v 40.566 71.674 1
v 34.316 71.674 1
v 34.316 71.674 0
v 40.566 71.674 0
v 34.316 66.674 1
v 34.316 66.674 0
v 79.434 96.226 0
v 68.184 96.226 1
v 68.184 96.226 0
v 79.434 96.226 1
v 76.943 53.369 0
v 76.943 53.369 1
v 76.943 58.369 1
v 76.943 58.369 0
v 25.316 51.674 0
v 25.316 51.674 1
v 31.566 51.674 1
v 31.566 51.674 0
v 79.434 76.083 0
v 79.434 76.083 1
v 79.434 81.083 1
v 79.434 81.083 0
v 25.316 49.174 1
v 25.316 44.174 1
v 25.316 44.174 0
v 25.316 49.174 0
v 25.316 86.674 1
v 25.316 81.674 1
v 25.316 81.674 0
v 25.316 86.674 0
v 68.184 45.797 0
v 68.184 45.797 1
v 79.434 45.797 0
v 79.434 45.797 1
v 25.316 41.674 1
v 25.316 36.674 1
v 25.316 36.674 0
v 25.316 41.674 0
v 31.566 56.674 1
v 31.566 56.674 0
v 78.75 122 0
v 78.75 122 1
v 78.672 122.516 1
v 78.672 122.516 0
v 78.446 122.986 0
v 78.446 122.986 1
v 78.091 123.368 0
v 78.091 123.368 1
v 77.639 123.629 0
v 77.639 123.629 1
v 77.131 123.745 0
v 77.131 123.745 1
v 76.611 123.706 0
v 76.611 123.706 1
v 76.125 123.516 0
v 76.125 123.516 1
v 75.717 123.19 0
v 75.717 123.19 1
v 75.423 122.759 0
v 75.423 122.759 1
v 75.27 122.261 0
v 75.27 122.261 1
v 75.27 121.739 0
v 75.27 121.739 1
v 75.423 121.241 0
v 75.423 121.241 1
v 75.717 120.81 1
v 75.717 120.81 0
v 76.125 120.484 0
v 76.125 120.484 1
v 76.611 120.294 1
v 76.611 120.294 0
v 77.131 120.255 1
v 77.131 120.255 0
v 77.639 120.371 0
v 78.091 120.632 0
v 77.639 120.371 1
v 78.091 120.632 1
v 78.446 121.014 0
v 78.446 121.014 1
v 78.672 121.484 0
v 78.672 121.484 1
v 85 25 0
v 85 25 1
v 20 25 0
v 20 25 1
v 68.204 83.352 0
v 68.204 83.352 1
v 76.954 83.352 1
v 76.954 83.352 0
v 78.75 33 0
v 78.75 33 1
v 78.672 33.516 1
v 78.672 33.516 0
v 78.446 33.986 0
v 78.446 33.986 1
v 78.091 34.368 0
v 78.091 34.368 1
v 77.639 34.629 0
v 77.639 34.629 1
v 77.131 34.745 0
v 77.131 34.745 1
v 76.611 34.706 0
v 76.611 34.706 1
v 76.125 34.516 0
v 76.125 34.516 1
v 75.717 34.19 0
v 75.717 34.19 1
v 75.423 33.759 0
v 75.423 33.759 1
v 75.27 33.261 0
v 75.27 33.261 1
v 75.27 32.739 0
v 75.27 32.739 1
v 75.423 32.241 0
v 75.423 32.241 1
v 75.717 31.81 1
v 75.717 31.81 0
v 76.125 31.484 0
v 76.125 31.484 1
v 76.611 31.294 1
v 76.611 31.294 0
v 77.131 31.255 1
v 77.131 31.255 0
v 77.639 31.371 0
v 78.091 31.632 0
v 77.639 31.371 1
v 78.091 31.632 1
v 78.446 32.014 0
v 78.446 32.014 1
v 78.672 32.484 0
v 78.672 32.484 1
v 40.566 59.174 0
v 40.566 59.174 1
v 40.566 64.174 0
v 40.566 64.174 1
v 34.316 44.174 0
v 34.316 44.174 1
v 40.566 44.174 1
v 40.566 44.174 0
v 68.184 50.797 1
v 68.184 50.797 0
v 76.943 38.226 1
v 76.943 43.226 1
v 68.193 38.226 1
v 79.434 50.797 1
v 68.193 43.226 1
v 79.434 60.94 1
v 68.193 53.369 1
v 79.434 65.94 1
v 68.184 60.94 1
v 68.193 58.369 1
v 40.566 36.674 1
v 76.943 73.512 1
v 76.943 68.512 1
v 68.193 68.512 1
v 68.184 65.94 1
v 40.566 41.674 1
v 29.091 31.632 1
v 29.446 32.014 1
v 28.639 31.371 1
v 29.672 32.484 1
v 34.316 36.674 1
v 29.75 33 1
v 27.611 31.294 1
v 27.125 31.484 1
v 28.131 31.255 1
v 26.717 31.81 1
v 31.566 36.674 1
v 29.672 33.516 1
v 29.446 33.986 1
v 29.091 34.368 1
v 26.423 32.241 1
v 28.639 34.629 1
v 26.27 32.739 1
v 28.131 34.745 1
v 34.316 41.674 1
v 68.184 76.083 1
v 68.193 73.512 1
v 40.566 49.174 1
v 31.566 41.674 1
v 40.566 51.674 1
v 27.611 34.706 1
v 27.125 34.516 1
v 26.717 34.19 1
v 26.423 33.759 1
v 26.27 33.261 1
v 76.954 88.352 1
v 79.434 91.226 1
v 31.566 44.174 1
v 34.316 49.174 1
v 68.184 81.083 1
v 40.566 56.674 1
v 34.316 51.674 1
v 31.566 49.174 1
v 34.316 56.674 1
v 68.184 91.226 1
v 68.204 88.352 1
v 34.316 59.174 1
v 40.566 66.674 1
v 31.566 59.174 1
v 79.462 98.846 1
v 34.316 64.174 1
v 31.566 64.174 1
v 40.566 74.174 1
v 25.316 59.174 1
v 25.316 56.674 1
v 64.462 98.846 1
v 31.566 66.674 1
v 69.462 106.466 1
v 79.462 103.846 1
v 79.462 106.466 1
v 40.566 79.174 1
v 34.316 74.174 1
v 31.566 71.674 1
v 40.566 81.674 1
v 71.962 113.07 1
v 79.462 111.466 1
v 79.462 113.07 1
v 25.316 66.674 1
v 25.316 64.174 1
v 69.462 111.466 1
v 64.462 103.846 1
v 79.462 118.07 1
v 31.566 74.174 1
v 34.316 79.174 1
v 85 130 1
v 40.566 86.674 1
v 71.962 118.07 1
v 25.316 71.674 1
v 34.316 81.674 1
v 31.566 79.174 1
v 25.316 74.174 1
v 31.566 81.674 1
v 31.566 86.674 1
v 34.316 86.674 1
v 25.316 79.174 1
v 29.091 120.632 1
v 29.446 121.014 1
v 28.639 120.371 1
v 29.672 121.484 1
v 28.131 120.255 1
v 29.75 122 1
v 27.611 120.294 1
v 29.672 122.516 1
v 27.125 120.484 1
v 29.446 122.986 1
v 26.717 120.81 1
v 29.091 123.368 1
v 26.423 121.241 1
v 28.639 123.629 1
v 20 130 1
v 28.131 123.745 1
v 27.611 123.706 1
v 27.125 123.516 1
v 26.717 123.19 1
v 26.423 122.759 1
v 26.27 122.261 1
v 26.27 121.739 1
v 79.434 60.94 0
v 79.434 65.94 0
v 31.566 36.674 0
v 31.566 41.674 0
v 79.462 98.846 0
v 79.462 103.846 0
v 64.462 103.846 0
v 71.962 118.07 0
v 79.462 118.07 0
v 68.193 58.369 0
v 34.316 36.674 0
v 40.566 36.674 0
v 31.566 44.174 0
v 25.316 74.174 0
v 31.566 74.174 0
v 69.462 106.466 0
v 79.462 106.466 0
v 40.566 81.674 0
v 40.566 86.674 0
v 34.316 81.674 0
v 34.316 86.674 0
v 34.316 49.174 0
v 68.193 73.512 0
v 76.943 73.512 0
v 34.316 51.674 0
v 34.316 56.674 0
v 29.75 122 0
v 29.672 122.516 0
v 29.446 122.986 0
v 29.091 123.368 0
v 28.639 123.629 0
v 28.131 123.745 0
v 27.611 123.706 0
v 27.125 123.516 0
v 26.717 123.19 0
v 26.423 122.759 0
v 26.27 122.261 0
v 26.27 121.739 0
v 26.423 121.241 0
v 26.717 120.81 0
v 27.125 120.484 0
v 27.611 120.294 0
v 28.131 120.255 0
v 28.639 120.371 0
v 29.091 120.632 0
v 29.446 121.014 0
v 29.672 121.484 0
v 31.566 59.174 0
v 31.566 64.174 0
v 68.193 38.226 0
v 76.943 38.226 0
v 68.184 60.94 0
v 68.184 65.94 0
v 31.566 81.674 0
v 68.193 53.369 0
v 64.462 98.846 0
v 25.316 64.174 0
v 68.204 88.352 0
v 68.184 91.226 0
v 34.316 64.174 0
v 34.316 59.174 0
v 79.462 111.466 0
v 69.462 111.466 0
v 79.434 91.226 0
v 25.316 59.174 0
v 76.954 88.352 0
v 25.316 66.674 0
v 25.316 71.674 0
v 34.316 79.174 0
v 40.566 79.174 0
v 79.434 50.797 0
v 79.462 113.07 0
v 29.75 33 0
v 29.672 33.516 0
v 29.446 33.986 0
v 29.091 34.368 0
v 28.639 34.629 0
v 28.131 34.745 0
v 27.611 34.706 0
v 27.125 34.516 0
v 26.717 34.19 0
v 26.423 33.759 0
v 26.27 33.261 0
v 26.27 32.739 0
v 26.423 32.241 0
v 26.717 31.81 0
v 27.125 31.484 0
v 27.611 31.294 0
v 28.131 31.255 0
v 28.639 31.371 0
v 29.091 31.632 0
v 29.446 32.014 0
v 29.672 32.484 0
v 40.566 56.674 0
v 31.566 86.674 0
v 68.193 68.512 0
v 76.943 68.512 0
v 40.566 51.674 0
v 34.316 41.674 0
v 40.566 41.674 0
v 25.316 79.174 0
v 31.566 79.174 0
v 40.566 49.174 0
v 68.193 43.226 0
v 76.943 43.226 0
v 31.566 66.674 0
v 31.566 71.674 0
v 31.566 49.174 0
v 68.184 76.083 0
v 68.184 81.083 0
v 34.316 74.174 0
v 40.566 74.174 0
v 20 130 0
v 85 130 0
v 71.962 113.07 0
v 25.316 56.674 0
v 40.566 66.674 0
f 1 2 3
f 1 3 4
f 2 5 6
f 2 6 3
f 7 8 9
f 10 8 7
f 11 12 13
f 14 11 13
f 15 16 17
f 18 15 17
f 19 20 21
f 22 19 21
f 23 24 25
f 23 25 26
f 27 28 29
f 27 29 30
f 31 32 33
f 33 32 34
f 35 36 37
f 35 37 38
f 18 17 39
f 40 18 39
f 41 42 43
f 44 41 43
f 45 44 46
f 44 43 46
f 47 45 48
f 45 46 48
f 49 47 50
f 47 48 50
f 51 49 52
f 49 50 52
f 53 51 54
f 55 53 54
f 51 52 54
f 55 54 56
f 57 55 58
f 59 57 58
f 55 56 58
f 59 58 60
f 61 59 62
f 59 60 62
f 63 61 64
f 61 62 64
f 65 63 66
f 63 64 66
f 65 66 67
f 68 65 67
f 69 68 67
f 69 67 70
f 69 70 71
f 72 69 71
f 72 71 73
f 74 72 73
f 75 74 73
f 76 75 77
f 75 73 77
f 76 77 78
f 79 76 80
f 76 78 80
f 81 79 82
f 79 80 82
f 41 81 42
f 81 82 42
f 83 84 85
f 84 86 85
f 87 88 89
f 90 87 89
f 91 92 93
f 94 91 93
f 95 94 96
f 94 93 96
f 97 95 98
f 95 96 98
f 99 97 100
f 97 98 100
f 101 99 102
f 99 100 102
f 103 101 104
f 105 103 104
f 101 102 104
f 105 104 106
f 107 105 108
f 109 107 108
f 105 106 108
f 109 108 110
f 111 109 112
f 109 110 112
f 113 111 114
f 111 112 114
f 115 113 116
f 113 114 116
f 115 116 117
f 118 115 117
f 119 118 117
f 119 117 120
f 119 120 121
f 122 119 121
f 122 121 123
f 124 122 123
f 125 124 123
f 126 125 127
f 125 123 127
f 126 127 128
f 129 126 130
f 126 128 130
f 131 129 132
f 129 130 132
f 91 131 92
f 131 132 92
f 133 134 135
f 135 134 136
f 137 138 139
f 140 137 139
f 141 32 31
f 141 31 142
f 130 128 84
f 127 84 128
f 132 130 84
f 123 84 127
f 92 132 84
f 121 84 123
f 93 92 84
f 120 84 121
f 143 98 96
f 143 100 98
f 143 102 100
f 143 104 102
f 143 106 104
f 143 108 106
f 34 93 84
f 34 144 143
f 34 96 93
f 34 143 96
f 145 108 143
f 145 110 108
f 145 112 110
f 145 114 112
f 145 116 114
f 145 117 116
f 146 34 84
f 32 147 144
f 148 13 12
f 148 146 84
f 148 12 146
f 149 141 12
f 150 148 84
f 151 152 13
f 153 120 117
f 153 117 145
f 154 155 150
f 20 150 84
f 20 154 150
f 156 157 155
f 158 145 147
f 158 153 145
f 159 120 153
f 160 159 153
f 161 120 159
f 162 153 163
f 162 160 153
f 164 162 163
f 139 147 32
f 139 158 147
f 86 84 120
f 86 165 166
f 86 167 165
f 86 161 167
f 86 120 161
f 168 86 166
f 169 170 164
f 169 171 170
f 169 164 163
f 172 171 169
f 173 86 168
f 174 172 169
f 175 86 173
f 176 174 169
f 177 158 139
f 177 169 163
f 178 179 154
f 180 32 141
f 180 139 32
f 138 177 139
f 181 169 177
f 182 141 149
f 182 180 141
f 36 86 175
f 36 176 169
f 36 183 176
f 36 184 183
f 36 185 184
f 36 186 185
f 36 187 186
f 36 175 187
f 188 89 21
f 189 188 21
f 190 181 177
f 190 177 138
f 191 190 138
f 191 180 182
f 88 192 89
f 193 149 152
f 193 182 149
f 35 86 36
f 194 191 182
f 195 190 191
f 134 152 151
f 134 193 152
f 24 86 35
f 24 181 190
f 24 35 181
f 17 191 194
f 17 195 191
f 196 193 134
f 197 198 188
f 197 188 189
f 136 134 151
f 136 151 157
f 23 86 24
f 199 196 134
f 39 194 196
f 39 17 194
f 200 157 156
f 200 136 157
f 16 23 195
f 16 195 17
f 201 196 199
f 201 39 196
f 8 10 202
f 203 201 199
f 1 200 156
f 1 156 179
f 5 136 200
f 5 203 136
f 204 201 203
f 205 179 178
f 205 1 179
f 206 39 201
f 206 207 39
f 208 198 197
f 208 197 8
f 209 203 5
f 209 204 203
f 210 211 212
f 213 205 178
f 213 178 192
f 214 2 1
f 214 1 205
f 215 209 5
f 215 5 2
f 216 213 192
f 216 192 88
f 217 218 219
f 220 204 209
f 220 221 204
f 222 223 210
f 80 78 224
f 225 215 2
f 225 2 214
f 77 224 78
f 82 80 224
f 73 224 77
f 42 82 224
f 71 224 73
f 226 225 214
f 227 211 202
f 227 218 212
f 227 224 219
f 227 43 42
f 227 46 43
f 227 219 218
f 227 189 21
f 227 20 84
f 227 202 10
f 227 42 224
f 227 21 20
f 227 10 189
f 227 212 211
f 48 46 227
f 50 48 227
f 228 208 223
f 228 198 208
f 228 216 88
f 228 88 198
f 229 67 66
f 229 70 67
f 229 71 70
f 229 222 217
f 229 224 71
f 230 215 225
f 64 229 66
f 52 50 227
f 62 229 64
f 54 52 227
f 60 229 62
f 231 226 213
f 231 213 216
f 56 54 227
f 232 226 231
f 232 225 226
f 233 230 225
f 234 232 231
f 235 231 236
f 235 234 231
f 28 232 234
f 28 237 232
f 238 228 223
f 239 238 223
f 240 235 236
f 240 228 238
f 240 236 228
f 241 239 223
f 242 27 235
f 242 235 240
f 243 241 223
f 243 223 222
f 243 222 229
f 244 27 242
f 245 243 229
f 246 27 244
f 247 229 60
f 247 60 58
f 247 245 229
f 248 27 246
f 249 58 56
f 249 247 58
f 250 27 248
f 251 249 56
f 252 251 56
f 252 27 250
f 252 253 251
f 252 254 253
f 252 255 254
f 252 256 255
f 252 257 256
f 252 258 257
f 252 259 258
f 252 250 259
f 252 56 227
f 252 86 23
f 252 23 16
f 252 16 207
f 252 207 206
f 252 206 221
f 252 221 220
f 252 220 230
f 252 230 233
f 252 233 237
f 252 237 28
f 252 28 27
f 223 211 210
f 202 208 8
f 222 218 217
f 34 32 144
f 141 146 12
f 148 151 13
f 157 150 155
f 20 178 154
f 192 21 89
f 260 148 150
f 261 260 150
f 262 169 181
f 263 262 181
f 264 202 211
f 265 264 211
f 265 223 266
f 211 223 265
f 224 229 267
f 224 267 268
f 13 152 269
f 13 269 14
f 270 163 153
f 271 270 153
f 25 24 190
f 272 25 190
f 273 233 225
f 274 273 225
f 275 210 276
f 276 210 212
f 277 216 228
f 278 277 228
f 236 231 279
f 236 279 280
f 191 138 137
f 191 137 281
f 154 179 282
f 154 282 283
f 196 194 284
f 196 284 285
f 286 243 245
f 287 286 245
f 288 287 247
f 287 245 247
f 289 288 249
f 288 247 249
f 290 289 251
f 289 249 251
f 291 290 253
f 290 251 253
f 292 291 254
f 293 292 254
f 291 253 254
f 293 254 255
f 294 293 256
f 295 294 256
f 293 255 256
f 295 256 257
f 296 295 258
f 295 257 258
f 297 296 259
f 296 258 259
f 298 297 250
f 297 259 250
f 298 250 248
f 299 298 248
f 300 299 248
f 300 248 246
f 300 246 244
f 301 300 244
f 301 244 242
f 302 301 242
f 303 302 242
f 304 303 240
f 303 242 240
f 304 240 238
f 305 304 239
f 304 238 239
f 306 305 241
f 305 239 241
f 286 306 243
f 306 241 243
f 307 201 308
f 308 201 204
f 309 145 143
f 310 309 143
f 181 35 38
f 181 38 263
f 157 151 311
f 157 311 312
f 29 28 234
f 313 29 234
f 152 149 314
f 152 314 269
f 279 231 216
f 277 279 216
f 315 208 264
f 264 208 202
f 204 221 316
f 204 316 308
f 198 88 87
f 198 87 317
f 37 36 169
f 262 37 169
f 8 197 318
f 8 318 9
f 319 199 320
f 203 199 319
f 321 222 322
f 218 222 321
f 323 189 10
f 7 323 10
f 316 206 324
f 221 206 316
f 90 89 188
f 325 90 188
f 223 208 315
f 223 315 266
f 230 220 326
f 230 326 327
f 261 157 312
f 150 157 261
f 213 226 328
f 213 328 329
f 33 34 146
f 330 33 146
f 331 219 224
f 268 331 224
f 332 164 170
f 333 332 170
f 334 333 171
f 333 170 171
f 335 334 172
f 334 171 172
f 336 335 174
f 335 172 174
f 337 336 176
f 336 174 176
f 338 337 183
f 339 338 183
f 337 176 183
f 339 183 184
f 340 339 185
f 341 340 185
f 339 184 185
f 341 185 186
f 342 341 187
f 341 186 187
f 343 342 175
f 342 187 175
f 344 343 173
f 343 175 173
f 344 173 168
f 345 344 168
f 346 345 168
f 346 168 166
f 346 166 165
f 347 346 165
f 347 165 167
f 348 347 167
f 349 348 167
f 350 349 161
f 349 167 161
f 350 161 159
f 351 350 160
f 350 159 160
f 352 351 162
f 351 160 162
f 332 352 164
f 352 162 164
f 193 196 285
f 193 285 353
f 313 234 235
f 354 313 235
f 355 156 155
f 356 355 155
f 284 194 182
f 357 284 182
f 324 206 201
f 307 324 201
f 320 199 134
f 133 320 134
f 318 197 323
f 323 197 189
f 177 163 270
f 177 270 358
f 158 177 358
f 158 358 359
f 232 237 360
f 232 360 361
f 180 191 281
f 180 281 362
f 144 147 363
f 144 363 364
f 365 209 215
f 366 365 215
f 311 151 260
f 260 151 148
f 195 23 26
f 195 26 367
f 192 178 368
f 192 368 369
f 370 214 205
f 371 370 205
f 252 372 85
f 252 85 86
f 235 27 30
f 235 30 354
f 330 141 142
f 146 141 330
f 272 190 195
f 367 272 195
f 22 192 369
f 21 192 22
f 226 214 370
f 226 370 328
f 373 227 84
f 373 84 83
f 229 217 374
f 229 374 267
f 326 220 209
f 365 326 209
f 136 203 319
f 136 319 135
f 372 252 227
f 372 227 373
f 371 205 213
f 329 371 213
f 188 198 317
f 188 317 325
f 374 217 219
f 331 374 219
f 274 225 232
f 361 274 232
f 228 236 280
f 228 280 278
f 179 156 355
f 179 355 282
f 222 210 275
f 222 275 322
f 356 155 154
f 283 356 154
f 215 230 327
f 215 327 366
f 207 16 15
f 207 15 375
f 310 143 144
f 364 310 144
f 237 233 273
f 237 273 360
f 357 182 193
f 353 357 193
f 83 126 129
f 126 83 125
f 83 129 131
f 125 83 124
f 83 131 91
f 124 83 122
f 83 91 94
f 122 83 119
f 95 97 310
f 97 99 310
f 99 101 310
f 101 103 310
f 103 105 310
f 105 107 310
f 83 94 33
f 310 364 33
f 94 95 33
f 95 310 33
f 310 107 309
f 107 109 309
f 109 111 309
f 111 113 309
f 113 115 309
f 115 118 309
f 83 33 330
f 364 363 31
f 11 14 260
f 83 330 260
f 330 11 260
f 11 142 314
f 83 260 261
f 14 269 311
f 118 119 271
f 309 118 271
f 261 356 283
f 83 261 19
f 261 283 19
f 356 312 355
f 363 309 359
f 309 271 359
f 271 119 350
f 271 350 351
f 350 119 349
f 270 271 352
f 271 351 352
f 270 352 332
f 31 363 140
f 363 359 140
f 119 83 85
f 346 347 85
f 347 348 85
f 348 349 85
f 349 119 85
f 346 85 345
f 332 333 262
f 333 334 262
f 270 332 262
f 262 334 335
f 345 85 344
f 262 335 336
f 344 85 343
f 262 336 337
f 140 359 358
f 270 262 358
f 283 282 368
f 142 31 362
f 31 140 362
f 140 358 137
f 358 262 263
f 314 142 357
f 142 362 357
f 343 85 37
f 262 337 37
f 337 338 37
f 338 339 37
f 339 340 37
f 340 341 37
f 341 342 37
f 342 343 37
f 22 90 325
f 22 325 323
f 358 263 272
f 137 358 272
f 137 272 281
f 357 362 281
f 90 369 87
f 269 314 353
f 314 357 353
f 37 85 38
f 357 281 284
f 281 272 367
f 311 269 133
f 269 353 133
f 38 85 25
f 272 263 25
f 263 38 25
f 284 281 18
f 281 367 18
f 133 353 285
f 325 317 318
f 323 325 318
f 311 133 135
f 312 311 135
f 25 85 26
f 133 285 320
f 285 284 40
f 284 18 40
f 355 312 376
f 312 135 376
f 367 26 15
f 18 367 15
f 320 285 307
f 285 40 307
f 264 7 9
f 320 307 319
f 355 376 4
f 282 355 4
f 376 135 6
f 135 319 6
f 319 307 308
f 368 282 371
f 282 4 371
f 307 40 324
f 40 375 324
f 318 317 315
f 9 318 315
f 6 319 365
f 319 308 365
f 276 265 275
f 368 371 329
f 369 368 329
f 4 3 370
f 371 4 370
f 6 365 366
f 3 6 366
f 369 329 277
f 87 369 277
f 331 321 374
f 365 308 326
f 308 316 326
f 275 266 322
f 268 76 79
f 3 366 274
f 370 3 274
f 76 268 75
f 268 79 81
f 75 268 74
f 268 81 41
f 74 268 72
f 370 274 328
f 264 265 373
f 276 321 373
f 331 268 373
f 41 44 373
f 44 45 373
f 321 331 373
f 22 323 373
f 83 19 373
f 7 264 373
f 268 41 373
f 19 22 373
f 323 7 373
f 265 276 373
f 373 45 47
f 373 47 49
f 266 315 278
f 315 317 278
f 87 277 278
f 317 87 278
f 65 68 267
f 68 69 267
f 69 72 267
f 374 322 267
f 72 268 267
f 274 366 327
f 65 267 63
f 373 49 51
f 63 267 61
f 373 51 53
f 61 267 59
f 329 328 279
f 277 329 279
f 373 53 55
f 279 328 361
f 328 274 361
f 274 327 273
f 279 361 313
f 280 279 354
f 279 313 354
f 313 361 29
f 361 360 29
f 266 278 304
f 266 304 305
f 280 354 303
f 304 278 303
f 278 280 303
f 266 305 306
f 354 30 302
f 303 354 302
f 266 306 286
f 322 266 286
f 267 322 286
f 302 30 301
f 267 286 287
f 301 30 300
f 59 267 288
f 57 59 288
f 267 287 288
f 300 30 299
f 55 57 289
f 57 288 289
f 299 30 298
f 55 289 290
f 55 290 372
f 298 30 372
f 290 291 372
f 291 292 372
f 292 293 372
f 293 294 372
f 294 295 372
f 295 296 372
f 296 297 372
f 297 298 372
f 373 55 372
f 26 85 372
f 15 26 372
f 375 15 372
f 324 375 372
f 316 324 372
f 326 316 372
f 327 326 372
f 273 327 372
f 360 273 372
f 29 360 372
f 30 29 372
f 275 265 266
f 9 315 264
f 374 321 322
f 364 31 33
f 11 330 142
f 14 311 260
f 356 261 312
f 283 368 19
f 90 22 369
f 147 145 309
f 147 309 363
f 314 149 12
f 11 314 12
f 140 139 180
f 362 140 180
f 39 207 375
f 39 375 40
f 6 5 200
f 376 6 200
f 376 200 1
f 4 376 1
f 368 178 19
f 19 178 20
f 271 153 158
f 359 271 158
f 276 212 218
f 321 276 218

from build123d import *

# Parameters (mm, degrees)
SKETCH_1_W          = 54.99998652
SKETCH_1_H          = 95.00001066
EXTRUDE_1_DEPTH     = 1
SKETCH_3_W          = 7.5000204
SKETCH_3_H          = 5
SKETCH_3_W_2        = 9.99999
SKETCH_3_W_3        = 14.99998
SKETCH_3_W_4        = 11.2500256
SKETCH_3_W_5        = 8.7500052
SKETCH_3_W_6        = 6.2500356
SKETCH_3_W_7        = 6.2499848
CUT_EXTRUDE_1_DEPTH = 1
SKETCH_7_R          = 1.75
CUT_EXTRUDE_4_DEPTH = 1
SKETCH_8_W          = 54.99998652
SKETCH_8_H          = 1
EXTRUDE_2_DEPTH     = 5
SKETCH_9_W          = 54.99998652
SKETCH_9_H          = 1
EXTRUDE_3_DEPTH     = 5
SKETCH_10_W         = 1
SKETCH_10_H         = 105.00001066
EXTRUDE_4_DEPTH     = 5
SKETCH_11_W         = 1
SKETCH_11_H         = 105.00001066
EXTRUDE_5_DEPTH     = 5


with BuildPart() as part:
    # 草图1 → 凸台-拉伸1 (new body)
    with BuildSketch(Plane.XY):
        with Locations((52.49999406, 77.49999359)):
            Rectangle(SKETCH_1_W, SKETCH_1_H)
    extrude(amount=EXTRUDE_1_DEPTH)

    # 草图3 → 切除-拉伸1 (cut)
    with BuildSketch(Plane.XY.offset(1)):
        with Locations((75.7119898, 115.57)):
            Rectangle(SKETCH_3_W, SKETCH_3_H)
        with Locations((74.462005, 108.966)):
            Rectangle(SKETCH_3_W_2, SKETCH_3_H)
        with Locations((71.96201254, 101.346)):
            Rectangle(SKETCH_3_W_3, SKETCH_3_H)
        with Locations((73.8089964, 93.726)):
            Rectangle(SKETCH_3_W_4, SKETCH_3_H)
        with Locations((72.5790014, 85.852)):
            Rectangle(SKETCH_3_W_5, SKETCH_3_H)
        with Locations((73.8089964, 78.5831296)):
            Rectangle(SKETCH_3_W_4, SKETCH_3_H)
        with Locations((72.5680286, 71.0116944)):
            Rectangle(SKETCH_3_W_5, SKETCH_3_H)
        with Locations((73.8089964, 63.44031)):
            Rectangle(SKETCH_3_W_4, SKETCH_3_H)
        with Locations((72.5680286, 55.8688748)):
            Rectangle(SKETCH_3_W_5, SKETCH_3_H)
        with Locations((73.8089964, 48.2974396)):
            Rectangle(SKETCH_3_W_4, SKETCH_3_H)
        with Locations((72.5680286, 40.7260044)):
            Rectangle(SKETCH_3_W_5, SKETCH_3_H)
        with Locations((37.440997, 84.1740252)):
            Rectangle(SKETCH_3_W_6, SKETCH_3_H)
        with Locations((28.4409896, 84.1740252)):
            Rectangle(SKETCH_3_W_7, SKETCH_3_H)
        with Locations((37.440997, 76.6740148)):
            Rectangle(SKETCH_3_W_6, SKETCH_3_H)
        with Locations((28.4409896, 76.6740148)):
            Rectangle(SKETCH_3_W_7, SKETCH_3_H)
        with Locations((37.440997, 69.1740044)):
            Rectangle(SKETCH_3_W_6, SKETCH_3_H)
        with Locations((28.4409896, 69.1740044)):
            Rectangle(SKETCH_3_W_7, SKETCH_3_H)
        with Locations((37.440997, 61.673994)):
            Rectangle(SKETCH_3_W_6, SKETCH_3_H)
        with Locations((28.4409896, 61.673994)):
            Rectangle(SKETCH_3_W_7, SKETCH_3_H)
        with Locations((37.440997, 54.1739836)):
            Rectangle(SKETCH_3_W_6, SKETCH_3_H)
        with Locations((28.4409896, 54.1739836)):
            Rectangle(SKETCH_3_W_7, SKETCH_3_H)
        with Locations((37.440997, 46.674024)):
            Rectangle(SKETCH_3_W_6, SKETCH_3_H)
        with Locations((28.4409896, 46.674024)):
            Rectangle(SKETCH_3_W_7, SKETCH_3_H)
        with Locations((37.440997, 39.1740136)):
            Rectangle(SKETCH_3_W_6, SKETCH_3_H)
        with Locations((28.4409896, 39.1740136)):
            Rectangle(SKETCH_3_W_7, SKETCH_3_H)
    extrude(amount=-CUT_EXTRUDE_1_DEPTH, mode=Mode.SUBTRACT)

    # 草图7 → 切除-拉伸4 (cut)
    with BuildSketch(Plane.XY.offset(1)):
        with Locations((77.00000094, 121.99999984)):
            Circle(SKETCH_7_R)
        with Locations((27.99999988, 121.99999984)):
            Circle(SKETCH_7_R)
        with Locations((77.00000094, 33.00000004)):
            Circle(SKETCH_7_R)
        with Locations((27.9999948, 32.9999848)):
            Circle(SKETCH_7_R)
    extrude(amount=-CUT_EXTRUDE_4_DEPTH, mode=Mode.SUBTRACT)

    # 草图8 → 凸台-拉伸2 (add)
    with BuildSketch(Plane(origin=(0, 124.99999892, 0), x_dir=(1, 0, 0), z_dir=(0, 1, 0))):
        with Locations((52.49999406, -0.5)):
            Rectangle(SKETCH_8_W, SKETCH_8_H)
    extrude(amount=EXTRUDE_2_DEPTH)

    # 草图9 → 凸台-拉伸3 (add)
    with BuildSketch(Plane.XZ.offset(-29.99998826)):
        with Locations((52.49999406, 0.5)):
            Rectangle(SKETCH_9_W, SKETCH_9_H)
    extrude(amount=EXTRUDE_3_DEPTH)

    # 草图10 → 凸台-拉伸4 (add)
    with BuildSketch(Plane.ZY.offset(-25.0000008)):
        with Locations((0.5, 77.49999359)):
            Rectangle(SKETCH_10_W, SKETCH_10_H)
    extrude(amount=EXTRUDE_4_DEPTH)

    # 草图11 → 凸台-拉伸5 (add)
    with BuildSketch(Plane(origin=(79.99998732, 0, 0), x_dir=(0, 0, -1), z_dir=(1, 0, 0))):
        with Locations((-0.5, 77.49999359)):
            Rectangle(SKETCH_11_W, SKETCH_11_H)
    extrude(amount=EXTRUDE_5_DEPTH)


solid = part.part
